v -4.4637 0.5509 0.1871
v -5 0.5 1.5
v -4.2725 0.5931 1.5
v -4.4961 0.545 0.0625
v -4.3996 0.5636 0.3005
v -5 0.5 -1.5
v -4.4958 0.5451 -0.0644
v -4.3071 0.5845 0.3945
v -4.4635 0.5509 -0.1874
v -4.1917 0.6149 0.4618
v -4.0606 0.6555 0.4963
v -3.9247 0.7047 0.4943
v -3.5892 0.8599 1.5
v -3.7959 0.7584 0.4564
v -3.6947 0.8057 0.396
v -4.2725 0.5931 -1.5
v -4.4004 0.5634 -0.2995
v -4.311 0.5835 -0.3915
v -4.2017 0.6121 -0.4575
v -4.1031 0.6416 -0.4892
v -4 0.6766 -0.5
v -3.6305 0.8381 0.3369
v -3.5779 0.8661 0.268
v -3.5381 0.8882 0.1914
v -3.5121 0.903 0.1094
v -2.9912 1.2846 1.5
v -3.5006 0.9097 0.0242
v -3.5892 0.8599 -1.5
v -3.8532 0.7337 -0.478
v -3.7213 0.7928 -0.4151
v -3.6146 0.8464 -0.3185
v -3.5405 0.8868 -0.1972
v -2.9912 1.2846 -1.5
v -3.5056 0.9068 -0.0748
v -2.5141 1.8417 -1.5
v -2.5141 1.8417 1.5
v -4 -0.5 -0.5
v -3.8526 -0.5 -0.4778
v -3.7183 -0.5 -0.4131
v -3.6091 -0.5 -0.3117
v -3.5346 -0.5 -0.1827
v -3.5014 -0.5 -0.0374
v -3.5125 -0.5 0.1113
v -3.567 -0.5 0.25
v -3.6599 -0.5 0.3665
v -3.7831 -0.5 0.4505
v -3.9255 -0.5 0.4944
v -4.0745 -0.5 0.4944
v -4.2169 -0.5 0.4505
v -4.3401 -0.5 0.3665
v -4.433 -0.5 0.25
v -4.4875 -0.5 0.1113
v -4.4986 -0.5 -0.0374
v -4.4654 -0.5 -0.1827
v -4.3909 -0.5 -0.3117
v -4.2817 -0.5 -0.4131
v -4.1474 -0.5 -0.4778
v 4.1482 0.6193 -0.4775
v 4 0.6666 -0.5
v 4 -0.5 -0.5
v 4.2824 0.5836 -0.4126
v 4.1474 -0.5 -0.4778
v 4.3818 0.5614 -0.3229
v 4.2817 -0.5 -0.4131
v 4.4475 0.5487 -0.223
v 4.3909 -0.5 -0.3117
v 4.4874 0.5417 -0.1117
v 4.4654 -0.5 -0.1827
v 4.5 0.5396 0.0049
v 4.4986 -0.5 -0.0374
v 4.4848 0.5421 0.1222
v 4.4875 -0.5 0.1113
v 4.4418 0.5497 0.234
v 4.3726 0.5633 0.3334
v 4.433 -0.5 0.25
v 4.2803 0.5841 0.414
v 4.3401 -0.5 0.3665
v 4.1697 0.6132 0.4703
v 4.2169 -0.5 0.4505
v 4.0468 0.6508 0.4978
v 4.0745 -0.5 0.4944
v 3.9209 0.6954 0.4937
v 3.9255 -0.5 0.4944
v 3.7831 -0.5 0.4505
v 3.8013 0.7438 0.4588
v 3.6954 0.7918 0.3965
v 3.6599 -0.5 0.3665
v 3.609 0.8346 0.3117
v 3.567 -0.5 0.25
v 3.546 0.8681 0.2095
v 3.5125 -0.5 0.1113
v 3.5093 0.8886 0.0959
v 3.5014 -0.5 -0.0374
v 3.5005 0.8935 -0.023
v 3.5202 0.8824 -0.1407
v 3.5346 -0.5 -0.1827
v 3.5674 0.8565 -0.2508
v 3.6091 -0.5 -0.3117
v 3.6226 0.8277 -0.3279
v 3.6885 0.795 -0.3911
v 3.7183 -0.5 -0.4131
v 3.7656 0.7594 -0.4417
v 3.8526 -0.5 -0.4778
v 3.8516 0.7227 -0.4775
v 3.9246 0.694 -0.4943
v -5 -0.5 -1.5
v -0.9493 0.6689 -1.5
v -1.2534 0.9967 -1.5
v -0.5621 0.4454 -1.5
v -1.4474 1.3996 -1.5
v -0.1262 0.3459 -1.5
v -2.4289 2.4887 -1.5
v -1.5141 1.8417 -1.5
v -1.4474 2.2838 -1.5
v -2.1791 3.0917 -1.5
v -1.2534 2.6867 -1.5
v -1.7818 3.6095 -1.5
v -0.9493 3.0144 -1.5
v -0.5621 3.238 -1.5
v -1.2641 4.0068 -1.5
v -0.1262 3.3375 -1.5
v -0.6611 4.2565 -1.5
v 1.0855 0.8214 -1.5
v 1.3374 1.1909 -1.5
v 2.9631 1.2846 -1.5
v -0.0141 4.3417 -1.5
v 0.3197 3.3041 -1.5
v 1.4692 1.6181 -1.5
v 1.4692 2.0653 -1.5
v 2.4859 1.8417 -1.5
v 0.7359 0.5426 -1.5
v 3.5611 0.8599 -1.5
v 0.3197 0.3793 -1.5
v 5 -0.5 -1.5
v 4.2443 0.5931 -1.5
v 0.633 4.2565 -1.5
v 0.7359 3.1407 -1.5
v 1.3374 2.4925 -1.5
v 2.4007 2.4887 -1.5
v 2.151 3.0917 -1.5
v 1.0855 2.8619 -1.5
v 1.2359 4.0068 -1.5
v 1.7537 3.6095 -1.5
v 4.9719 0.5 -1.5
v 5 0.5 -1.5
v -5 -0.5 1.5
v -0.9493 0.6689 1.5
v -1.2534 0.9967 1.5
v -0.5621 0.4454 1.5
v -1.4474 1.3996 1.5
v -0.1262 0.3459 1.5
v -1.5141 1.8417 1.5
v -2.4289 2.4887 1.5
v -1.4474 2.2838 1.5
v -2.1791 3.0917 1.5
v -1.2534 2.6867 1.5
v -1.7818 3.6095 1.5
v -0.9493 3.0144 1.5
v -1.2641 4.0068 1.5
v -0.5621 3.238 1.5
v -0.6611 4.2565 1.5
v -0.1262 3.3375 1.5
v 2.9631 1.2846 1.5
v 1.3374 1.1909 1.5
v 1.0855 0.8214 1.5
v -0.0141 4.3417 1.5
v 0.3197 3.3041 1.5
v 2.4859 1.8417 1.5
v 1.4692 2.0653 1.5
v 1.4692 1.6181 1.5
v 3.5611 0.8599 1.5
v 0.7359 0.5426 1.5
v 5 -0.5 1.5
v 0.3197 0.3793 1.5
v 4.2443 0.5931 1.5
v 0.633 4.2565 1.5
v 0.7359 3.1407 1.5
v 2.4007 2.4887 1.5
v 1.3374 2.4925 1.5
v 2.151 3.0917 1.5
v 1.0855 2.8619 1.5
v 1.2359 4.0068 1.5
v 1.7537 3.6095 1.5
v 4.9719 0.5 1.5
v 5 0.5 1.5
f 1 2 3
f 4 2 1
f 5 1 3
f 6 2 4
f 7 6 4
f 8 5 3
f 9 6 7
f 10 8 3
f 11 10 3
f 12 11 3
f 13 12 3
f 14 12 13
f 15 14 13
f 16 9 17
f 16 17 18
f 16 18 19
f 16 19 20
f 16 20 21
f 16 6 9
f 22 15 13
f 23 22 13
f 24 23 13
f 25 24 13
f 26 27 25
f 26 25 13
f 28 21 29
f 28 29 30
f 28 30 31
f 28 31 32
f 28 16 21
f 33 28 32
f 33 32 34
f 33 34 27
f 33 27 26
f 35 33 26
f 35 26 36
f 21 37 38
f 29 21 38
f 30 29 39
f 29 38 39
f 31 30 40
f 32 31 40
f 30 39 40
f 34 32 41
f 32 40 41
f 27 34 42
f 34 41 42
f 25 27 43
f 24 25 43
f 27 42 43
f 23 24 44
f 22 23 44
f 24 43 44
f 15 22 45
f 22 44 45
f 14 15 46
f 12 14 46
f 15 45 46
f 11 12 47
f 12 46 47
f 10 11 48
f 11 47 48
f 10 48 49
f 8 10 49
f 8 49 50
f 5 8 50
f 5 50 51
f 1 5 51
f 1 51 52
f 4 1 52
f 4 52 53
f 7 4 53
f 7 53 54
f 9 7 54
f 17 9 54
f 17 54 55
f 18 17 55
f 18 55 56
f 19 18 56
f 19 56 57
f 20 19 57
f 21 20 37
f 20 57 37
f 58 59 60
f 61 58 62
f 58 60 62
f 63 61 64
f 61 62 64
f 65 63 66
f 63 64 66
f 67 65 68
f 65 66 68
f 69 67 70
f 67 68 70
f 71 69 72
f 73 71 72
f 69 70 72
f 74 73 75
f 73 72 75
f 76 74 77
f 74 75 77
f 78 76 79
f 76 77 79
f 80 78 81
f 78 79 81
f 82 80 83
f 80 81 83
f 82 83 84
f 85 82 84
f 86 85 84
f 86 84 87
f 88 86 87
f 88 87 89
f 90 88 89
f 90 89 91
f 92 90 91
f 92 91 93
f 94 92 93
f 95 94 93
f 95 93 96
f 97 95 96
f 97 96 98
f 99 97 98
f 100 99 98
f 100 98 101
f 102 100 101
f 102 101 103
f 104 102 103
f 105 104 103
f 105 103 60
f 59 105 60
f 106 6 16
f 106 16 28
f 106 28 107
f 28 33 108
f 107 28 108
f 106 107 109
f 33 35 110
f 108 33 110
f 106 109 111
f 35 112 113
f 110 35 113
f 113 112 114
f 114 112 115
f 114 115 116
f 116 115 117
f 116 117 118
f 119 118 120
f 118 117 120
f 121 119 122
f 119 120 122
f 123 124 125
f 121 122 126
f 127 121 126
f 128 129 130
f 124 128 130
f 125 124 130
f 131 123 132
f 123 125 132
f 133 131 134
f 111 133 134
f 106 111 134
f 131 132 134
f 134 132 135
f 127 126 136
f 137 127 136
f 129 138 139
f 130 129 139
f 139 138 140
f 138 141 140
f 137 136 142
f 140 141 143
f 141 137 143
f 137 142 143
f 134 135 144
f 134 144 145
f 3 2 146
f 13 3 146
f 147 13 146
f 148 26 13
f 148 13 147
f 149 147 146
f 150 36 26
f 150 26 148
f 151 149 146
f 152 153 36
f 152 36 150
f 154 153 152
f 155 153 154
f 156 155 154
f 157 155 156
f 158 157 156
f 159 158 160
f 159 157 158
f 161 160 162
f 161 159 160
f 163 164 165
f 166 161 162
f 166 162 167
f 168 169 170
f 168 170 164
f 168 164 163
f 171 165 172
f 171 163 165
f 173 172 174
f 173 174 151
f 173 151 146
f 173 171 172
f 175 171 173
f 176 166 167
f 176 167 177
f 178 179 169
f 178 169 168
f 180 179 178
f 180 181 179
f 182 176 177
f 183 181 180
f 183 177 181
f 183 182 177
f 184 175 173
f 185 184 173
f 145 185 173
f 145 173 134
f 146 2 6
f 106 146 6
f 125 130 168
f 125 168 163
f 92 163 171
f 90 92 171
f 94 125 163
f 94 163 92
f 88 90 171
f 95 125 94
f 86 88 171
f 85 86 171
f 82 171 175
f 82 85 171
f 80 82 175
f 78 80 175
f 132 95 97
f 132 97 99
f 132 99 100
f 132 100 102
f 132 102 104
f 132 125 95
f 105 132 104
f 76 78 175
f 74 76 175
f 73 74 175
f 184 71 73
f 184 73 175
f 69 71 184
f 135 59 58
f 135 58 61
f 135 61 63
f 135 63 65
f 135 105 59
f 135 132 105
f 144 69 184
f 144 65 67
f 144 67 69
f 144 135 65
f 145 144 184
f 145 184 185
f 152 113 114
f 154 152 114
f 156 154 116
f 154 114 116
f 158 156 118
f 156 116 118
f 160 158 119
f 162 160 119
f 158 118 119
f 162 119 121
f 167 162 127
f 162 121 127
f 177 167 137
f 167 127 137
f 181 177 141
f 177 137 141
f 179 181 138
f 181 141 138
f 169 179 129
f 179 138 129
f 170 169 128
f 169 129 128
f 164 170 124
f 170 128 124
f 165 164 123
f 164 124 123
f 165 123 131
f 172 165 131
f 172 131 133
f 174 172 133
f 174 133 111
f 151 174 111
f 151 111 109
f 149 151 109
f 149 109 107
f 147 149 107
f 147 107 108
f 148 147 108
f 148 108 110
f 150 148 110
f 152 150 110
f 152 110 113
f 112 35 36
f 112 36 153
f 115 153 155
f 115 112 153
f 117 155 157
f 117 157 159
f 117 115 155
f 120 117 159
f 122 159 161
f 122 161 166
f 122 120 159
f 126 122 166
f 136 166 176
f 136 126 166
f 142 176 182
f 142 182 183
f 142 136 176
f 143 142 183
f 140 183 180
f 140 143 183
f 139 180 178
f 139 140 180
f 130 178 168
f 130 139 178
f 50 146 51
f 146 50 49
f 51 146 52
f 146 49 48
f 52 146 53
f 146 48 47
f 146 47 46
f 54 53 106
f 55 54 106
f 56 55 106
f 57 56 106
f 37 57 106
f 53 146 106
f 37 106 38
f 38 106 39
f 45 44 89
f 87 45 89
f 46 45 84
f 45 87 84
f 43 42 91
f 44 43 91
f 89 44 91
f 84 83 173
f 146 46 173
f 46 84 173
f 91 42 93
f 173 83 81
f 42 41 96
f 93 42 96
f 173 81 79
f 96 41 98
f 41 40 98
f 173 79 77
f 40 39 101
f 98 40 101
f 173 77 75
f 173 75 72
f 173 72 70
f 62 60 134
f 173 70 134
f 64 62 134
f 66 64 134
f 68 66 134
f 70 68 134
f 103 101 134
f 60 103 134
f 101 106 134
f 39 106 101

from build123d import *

# Parameters (mm, degrees)
SKETCH1_W           = 10
SKETCH1_H           = 3
BOSS_EXTRUDE1_DEPTH = 0.5
BOSS_EXTRUDE2_DEPTH = 3
CUT_EXTRUDE1_REACH  = 9.27
SKETCH4_R           = 1.5
CUT_EXTRUDE2_REACH  = 9.12
SKETCH5_R           = 0.5


with BuildPart() as part:
    # Sketch1 → Boss-Extrude1 (new, symmetric)
    with BuildSketch(Plane(origin=(0, 0, 0), x_dir=(1, 0, 0), z_dir=(0, 1, 0))):
        Rectangle(SKETCH1_W, SKETCH1_H)
    extrude(amount=BOSS_EXTRUDE1_DEPTH, both=True)

    # Sketch3 → Boss-Extrude2 (add)
    with BuildSketch(Plane(origin=(0, 0, -1.5), x_dir=(-1, 0, 0), z_dir=(0, 0, -1))):
        with BuildLine():
            Line((-5, 0.5), (-5, 0))
            Line((-5, 0), (5, 0))
            Line((5, 0), (5, 0.5))
            ThreePointArc((5, 0.5), (3.589234213, 0.859934084), (2.514072517, 1.841687605))
            ThreePointArc((2.514072517, 1.841687605), (0.014072517, 4.341687605), (-2.485927483, 1.841687605))
            ThreePointArc((-2.485927483, 1.841687605), (-3.573488857, 0.853279454), (-5, 0.5))
        make_face()
    extrude(amount=-BOSS_EXTRUDE2_DEPTH)

    # Sketch4 → Cut-Extrude1 (cut, up to next)
    with BuildSketch(Plane(origin=(0, 0, -1.5), x_dir=(-1, 0, 0), z_dir=(0, 0, -1)), mode=Mode.PRIVATE) as cut_extrude1_sk1:
        with Locations((0.014072517, 1.841687605)):
            Circle(SKETCH4_R)
    cut_extrude1_tool1 = extrude(cut_extrude1_sk1.sketch, amount=-CUT_EXTRUDE1_REACH, mode=Mode.PRIVATE) & part.part
    add(cut_extrude1_tool1.solids().sort_by_distance((-0.014073, 1.841688, -1.5))[0], mode=Mode.SUBTRACT)

    # Sketch5 → Cut-Extrude2 (cut, up to next)
    with BuildSketch(Plane.XZ.offset(0.5), mode=Mode.PRIVATE) as cut_extrude2_sk1:
        with Locations(Location((-4, 0, 0), (0, 0, 270))):
            Circle(SKETCH5_R)
    cut_extrude2_tool1 = extrude(cut_extrude2_sk1.sketch, amount=-CUT_EXTRUDE2_REACH, mode=Mode.PRIVATE) & part.part
    # Sketch5 → Cut-Extrude2 (cut, up to next)
    with BuildSketch(Plane.XZ.offset(0.5), mode=Mode.PRIVATE) as cut_extrude2_sk2:
        with Locations(Location((4, 0, 0), (0, 0, 270))):
            Circle(SKETCH5_R)
    cut_extrude2_tool2 = extrude(cut_extrude2_sk2.sketch, amount=-CUT_EXTRUDE2_REACH, mode=Mode.PRIVATE) & part.part
    add(cut_extrude2_tool1.solids().sort_by_distance((-4, -0.5, 0))[0], mode=Mode.SUBTRACT)
    add(cut_extrude2_tool2.solids().sort_by_distance((4, -0.5, 0))[0], mode=Mode.SUBTRACT)


solid = part.part
